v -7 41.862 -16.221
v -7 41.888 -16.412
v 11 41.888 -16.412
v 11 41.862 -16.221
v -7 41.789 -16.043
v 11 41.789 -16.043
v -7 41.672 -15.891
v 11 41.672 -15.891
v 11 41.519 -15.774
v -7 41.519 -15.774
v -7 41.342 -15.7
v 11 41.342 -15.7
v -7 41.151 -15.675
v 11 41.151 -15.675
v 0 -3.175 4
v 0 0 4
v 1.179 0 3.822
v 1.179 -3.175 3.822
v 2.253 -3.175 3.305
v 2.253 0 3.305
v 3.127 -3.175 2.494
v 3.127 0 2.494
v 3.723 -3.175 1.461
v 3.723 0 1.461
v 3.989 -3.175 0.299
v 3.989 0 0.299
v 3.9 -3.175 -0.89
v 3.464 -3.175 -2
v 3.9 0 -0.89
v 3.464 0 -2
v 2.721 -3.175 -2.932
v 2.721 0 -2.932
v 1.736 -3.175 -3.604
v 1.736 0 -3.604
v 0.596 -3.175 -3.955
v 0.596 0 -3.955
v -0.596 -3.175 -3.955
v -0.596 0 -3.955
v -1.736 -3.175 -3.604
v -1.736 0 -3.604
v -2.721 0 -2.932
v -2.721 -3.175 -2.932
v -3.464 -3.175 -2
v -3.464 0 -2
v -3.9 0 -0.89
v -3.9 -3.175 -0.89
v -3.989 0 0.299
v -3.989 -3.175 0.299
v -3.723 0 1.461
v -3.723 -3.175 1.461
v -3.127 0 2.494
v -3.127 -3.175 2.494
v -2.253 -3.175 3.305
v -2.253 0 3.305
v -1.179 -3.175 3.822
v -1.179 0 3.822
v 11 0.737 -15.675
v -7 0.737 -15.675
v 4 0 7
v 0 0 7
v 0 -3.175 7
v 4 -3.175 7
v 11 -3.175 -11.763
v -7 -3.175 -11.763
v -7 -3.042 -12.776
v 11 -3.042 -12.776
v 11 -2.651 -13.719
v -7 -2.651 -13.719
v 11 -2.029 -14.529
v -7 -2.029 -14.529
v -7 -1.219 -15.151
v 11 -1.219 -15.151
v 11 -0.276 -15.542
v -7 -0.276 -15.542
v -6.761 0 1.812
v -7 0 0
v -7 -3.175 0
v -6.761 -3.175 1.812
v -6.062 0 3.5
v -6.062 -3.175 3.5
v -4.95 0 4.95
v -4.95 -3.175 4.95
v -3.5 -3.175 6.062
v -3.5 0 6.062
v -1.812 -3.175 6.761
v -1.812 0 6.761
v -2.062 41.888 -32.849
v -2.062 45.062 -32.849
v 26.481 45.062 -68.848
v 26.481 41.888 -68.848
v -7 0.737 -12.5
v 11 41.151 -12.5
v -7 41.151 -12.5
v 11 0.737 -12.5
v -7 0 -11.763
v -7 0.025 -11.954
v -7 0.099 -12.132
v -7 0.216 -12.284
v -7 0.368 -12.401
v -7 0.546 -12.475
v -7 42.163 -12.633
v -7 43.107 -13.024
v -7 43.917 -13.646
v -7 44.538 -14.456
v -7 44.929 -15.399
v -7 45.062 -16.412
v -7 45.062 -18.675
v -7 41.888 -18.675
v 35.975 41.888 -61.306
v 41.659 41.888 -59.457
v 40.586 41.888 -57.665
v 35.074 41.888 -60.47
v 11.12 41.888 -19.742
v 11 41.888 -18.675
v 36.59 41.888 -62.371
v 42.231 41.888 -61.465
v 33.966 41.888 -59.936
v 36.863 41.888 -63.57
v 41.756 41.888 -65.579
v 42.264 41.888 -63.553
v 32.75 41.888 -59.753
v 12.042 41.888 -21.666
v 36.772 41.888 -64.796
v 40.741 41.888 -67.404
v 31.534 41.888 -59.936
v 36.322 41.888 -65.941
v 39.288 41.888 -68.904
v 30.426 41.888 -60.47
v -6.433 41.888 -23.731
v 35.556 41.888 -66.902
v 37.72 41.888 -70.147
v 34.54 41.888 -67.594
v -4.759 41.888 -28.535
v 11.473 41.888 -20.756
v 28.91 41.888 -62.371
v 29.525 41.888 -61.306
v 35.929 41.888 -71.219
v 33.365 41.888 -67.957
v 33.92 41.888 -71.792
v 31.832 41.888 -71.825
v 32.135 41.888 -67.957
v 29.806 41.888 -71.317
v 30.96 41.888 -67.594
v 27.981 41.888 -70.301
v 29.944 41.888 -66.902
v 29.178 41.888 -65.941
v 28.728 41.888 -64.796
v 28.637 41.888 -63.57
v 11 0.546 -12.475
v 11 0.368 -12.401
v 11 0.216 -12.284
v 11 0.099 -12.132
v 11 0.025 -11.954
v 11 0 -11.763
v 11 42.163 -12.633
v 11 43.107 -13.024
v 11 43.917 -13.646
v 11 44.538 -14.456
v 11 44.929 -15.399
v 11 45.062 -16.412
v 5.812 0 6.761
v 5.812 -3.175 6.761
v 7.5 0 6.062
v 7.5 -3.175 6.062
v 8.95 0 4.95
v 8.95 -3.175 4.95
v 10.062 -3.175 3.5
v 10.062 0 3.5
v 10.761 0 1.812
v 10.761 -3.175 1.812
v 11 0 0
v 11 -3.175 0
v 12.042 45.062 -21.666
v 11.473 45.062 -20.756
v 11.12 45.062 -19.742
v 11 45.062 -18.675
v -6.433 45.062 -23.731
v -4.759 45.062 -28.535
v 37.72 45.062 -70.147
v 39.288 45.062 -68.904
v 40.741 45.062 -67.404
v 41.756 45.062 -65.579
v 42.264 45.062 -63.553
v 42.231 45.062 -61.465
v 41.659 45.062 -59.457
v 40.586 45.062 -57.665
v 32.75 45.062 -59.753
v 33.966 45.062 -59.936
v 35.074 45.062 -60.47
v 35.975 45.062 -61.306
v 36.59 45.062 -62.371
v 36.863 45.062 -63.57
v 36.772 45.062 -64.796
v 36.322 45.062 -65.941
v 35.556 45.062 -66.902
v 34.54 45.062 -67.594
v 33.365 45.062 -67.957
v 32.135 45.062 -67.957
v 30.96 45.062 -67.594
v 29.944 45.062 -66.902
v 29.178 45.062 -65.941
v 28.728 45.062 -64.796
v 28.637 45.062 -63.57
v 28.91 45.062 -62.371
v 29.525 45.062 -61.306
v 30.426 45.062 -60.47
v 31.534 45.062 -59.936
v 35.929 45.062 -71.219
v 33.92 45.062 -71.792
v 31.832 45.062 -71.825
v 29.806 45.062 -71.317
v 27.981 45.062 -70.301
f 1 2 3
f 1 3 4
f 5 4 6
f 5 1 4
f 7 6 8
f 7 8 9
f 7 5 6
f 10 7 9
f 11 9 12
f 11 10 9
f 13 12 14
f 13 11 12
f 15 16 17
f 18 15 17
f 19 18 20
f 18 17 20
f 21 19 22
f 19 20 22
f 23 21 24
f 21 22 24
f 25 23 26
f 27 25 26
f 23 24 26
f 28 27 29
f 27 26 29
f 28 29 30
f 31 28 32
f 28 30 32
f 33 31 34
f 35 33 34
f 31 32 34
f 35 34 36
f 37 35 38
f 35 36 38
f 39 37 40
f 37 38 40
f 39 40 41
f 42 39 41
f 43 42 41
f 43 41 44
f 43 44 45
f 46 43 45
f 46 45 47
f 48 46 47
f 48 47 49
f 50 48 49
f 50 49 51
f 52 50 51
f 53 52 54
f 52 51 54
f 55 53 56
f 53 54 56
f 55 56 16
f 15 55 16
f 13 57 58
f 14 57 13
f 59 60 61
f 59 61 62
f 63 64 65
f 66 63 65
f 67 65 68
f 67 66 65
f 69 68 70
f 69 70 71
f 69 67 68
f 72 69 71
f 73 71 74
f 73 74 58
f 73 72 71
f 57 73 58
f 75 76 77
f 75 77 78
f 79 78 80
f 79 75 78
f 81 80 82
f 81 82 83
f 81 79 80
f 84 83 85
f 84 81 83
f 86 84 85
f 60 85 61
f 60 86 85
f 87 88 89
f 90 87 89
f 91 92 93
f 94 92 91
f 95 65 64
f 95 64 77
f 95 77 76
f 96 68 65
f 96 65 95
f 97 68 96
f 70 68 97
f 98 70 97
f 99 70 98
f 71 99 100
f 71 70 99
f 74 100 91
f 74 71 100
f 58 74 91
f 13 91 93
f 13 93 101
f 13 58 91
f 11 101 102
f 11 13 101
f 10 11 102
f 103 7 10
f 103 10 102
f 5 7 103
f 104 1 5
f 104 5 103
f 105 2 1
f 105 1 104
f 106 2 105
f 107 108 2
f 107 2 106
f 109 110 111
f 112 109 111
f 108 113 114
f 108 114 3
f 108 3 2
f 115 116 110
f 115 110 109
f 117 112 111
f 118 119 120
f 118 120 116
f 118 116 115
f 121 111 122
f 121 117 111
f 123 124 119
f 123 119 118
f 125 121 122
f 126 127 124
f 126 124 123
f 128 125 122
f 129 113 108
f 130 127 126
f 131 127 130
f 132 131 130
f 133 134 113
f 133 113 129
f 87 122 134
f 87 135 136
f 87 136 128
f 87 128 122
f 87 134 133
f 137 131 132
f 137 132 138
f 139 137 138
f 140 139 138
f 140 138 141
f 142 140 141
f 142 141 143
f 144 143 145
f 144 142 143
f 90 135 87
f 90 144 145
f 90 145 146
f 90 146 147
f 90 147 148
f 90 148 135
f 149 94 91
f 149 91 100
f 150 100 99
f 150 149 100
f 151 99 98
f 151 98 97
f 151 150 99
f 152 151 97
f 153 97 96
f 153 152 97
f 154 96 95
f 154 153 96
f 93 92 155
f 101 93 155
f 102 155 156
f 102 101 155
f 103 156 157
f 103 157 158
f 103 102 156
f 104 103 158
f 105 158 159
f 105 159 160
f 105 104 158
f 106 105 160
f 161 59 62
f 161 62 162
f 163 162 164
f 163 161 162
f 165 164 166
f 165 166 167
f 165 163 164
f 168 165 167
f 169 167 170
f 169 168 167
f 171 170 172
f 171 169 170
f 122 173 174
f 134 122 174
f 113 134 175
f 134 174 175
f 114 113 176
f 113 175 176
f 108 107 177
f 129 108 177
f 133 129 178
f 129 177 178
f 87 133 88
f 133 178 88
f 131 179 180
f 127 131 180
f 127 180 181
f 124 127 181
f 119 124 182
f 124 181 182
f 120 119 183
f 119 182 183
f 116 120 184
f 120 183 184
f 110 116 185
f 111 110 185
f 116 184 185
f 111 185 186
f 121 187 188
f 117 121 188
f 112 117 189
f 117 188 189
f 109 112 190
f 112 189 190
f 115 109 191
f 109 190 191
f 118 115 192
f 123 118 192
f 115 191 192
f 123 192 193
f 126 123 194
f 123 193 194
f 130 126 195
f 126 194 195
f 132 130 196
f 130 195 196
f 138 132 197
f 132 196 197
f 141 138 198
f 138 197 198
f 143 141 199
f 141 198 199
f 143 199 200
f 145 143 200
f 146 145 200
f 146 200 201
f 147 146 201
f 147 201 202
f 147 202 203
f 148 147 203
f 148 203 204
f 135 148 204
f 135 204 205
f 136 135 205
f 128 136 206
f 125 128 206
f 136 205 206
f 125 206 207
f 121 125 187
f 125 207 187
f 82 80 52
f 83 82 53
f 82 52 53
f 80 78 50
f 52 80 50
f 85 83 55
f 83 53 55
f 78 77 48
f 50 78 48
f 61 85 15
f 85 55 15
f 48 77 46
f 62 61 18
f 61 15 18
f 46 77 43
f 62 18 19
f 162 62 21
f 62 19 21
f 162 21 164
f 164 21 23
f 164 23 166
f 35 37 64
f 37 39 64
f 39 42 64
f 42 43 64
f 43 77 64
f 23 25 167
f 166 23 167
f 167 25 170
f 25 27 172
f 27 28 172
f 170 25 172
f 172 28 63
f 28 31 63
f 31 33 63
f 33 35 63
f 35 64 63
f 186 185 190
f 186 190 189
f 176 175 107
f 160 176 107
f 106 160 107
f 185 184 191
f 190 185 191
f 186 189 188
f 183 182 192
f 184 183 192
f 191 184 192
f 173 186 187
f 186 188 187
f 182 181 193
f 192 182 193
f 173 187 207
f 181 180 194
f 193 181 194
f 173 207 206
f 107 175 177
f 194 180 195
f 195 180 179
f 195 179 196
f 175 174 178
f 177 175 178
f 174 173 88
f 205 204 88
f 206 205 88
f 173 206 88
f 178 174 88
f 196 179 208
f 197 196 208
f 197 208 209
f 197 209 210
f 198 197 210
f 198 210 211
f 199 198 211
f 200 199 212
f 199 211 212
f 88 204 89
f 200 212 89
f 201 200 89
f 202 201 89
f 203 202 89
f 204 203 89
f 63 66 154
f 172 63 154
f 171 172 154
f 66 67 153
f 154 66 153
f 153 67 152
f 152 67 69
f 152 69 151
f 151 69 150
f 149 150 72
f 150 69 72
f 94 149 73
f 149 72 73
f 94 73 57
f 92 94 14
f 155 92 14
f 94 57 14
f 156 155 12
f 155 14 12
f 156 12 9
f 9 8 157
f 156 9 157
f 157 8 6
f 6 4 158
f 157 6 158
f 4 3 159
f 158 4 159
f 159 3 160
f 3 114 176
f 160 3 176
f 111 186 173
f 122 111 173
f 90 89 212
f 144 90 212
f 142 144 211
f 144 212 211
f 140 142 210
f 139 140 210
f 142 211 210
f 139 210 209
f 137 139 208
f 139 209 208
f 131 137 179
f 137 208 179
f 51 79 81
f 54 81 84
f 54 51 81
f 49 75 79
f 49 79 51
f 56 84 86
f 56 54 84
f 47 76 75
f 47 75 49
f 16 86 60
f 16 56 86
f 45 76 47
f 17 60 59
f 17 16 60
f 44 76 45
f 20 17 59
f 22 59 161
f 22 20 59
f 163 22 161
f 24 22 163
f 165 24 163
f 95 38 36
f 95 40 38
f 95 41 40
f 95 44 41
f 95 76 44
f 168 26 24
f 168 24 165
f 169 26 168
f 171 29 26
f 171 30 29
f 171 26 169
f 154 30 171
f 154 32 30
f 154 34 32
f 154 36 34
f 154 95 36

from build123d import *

# Parameters (mm, degrees)
SKETCH1_R                    = 4
BASE_FLANGE1_DEPTH           = 3.175
EDGE_FLANGE1_STRIP_W         = 14.1732
EDGE_FLANGE1_STRIP_H         = 3.175
EDGE_FLANGE1_STRIP_CUT_DEPTH = 18
EDGE_FLANGE1_DEPTH           = 18
EDGE_FLANGE2_STRIP_W         = 14.1732
EDGE_FLANGE2_STRIP_H         = 3.175
EDGE_FLANGE2_STRIP_CUT_DEPTH = 18
EDGE_FLANGE2_DEPTH           = 18
SKETCH12_R                   = 4.125
BOSS_EXTRUDE1_DEPTH          = 3.175


# Sheet-metal steps are written as plain solids
with BuildPart() as part:
    # Sketch1 → Base-Flange1 (new body)
    with BuildSketch(Plane(origin=(0, 0, 0), x_dir=(1, 0, 0), z_dir=(0, 1, 0))):
        with BuildLine():
            Line((-7, 12.5), (-7, 0))
            ThreePointArc((-7, 0), (-4.949747468, -4.949747468), (0, -7))
            Line((0, -7), (4, -7))
            ThreePointArc((4, -7), (8.949747468, -4.949747468), (11, 0))
            Line((11, 0), (11, 12.5))
            Line((11, 12.5), (-7, 12.5))
        make_face()
        with Locations(Location((0, 0, 0), (0, 0, 270))):
            Circle(SKETCH1_R, mode=Mode.SUBTRACT)
    extrude(amount=-BASE_FLANGE1_DEPTH)

    # Edge-Flange1 strip (across the edge) → Edge-Flange1 strip cut (cut)
    with BuildSketch(Plane(origin=(11, 0, -12.5), x_dir=(0, 0, 1), z_dir=(-1, 0, 0))):
        with Locations((-6.35, -1.5875)):
            Rectangle(EDGE_FLANGE1_STRIP_W, EDGE_FLANGE1_STRIP_H)
    extrude(amount=EDGE_FLANGE1_STRIP_CUT_DEPTH, mode=Mode.SUBTRACT)

    # Edge-Flange1 section (across the edge) → Edge-Flange1 (add)
    with BuildSketch(Plane(origin=(11, 0, -12.5), x_dir=(0, 0, 1), z_dir=(-1, 0, 0))):
        with BuildLine():
            Line((-3.175, 0.7366), (-3.175, 41.8875))
            Line((-3.175, 41.8875), (0, 41.8875))
            Line((0, 41.8875), (0, 0.7366))
            ThreePointArc((0, 0.7366), (0.215745145, 0.215745145), (0.7366, 0))
            Line((0.7366, 0), (0.7366, -3.175))
            ThreePointArc((0.7366, -3.175), (-2.029318885, -2.029318885), (-3.175, 0.7366))
        make_face()
    extrude(amount=EDGE_FLANGE1_DEPTH)

    # Edge-Flange2 strip (across the edge) → Edge-Flange2 strip cut (cut)
    with BuildSketch(Plane(origin=(-7, 41.8875, -15.675), x_dir=(0, -1, 0), z_dir=(1, 0, 0))):
        with Locations((-6.35, -1.5875)):
            Rectangle(EDGE_FLANGE2_STRIP_W, EDGE_FLANGE2_STRIP_H)
    extrude(amount=EDGE_FLANGE2_STRIP_CUT_DEPTH, mode=Mode.SUBTRACT)

    # Edge-Flange2 section (across the edge) → Edge-Flange2 (add)
    with BuildSketch(Plane(origin=(-7, 41.8875, -15.675), x_dir=(0, -1, 0), z_dir=(1, 0, 0))):
        with BuildLine():
            Line((-3.175, 0.7366), (-3.175, 3))
            Line((-3.175, 3), (0, 3))
            Line((0, 3), (0, 0.7366))
            ThreePointArc((0, 0.7366), (0.215745145, 0.215745145), (0.7366, 0))
            Line((0.7366, 0), (0.7366, -3.175))
            ThreePointArc((0.7366, -3.175), (-2.029318885, -2.029318885), (-3.175, 0.7366))
        make_face()
    extrude(amount=EDGE_FLANGE2_DEPTH)

    # Sketch12 → Boss-Extrude1 (add)
    with BuildSketch(Plane(origin=(0, 45.0625, 0), x_dir=(1, 0, 0), z_dir=(0, 1, 0))):
        with BuildLine():
            Line((11, 18.675), (-7, 18.675))
            ThreePointArc((-7, 18.675), (-5.730267968, 26.179894377), (-2.062407049, 32.849411251))
            Line((-2.062407049, 32.849411251), (26.4814048, 68.848399382))
            ThreePointArc((26.4814048, 68.848399382), (31.832032475, 71.825161968), (37.720386598, 70.146585866))
            Line((37.720386598, 70.146585866), (39.287532633, 68.903986451))
            ThreePointArc((39.287532633, 68.903986451), (42.264295219, 63.553358776), (40.585719117, 57.665004653))
            Line((40.585719117, 57.665004653), (12.041907268, 21.666016522))
            ThreePointArc((12.041907268, 21.666016522), (11.267932785, 20.258646945), (11, 18.675))
        make_face()
        with Locations(Location((32.749988941, 63.878001725, 0), (0, 0, 270))):
            Circle(SKETCH12_R, mode=Mode.SUBTRACT)
    extrude(amount=-BOSS_EXTRUDE1_DEPTH)


solid = part.part
